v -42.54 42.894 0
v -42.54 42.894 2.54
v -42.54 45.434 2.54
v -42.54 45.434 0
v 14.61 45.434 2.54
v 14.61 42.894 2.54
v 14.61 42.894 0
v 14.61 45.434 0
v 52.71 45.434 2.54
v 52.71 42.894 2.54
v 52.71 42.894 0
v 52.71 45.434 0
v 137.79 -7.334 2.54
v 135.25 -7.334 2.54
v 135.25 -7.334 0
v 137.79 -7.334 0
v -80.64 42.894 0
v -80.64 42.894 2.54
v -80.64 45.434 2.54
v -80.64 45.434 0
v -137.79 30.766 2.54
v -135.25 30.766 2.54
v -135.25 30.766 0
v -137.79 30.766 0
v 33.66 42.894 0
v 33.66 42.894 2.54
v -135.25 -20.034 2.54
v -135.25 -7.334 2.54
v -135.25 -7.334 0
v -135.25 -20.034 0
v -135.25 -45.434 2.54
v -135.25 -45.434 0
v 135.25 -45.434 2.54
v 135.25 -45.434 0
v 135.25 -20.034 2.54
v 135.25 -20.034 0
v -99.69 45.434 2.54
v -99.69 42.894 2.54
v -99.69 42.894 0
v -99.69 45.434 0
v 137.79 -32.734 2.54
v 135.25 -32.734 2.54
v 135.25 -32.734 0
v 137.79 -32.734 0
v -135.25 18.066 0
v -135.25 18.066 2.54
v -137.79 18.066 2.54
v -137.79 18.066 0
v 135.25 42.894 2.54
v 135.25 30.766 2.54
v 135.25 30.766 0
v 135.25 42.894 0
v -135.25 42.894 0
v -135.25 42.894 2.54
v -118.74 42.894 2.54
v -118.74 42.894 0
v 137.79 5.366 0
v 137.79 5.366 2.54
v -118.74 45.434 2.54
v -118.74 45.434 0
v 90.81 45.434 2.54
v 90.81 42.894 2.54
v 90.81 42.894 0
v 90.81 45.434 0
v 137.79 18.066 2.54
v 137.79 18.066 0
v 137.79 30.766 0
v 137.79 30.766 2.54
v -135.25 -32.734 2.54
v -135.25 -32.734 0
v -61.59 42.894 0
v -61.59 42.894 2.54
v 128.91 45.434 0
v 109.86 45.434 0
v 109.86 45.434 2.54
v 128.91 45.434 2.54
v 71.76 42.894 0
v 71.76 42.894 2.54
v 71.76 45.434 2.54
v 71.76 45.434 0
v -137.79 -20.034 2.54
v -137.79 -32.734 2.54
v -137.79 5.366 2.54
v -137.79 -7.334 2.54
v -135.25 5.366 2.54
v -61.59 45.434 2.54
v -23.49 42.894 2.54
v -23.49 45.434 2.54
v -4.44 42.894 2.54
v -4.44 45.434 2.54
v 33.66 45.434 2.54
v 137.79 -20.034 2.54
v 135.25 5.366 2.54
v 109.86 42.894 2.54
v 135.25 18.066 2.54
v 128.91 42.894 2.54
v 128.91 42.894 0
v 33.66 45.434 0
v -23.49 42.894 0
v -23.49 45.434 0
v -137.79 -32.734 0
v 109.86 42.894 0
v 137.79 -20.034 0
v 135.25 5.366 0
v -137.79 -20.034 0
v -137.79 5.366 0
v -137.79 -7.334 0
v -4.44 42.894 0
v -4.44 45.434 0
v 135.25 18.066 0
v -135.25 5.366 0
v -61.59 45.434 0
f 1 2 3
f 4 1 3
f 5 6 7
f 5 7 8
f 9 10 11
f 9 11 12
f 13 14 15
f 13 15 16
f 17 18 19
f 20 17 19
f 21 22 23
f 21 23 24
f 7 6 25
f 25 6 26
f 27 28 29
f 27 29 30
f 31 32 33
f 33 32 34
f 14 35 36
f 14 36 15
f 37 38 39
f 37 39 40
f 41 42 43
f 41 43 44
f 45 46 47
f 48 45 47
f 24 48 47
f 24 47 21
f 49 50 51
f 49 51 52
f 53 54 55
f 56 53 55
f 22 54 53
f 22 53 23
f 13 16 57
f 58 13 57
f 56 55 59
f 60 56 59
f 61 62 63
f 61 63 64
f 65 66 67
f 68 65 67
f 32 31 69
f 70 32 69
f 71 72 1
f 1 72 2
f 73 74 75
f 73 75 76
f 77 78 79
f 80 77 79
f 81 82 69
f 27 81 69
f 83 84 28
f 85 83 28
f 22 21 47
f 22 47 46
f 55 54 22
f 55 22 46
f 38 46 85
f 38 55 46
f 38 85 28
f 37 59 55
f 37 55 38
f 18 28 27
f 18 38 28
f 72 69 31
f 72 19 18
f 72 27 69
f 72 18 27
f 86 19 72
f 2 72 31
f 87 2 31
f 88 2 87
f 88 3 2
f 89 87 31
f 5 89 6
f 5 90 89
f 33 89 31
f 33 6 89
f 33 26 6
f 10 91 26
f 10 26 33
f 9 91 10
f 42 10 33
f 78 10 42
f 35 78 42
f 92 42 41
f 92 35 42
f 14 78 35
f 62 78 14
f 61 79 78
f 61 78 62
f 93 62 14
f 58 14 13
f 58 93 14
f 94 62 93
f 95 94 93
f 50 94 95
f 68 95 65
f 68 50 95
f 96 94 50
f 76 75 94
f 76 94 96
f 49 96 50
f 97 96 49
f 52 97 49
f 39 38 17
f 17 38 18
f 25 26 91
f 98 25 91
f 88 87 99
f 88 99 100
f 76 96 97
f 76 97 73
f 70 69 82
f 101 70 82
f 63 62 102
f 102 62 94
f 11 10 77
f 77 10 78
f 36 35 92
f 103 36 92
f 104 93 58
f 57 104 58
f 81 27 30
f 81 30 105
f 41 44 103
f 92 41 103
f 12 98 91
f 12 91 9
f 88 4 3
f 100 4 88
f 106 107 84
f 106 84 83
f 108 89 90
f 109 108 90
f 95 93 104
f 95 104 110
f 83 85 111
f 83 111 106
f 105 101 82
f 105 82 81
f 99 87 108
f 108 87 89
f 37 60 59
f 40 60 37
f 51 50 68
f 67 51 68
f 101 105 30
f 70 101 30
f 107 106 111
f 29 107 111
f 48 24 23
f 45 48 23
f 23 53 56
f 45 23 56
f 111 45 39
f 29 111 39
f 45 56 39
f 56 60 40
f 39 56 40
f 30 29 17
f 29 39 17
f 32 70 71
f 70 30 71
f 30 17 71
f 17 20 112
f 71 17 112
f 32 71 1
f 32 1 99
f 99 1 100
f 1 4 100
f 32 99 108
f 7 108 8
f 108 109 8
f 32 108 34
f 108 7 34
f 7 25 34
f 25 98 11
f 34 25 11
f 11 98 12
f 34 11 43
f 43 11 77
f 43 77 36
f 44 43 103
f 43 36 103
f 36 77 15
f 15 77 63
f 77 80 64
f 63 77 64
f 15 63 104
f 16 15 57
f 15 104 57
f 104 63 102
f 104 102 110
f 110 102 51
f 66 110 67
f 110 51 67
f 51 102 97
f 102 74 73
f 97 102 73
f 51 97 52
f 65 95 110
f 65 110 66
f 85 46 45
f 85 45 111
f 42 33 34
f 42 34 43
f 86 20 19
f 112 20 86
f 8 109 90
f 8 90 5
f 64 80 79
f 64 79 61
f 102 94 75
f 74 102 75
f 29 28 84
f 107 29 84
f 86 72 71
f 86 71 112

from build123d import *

# Parameters (mm, degrees)
SKETCH1_W               = 275.57984
SKETCH1_H               = 90.8685
BOSS_EXTRUDE1_DEPTH     = 2.54
SKETCH2_W               = 2.54
SKETCH2_H               = 12.7
CUT_EXTRUDE1_DEPTH      = 146.109561114
LPATTERN1_COUNT         = 4
LPATTERN1_PITCH         = 25.4
MIRROR1_COPY_1_SKETCH_W = 2.54
MIRROR1_COPY_1_SKETCH_H = 12.7
MIRROR1_COPY_1_DEPTH    = 146.109561114
MIRROR1_COPY_2_SKETCH_W = 2.54
MIRROR1_COPY_2_SKETCH_H = 12.7
MIRROR1_COPY_2_DEPTH    = 146.109561114
MIRROR1_COPY_3_SKETCH_W = 2.54
MIRROR1_COPY_3_SKETCH_H = 12.7
MIRROR1_COPY_3_DEPTH    = 146.109561114
SKETCH3_W               = 19.05
SKETCH3_H               = 2.54
CUT_EXTRUDE2_DEPTH      = 146.109561114
LPATTERN2_COUNT         = 8
LPATTERN2_PITCH         = 38.1


with BuildPart() as part:
    # Sketch1 → Boss-Extrude1 (new body)
    with BuildSketch(Plane.XY):
        Rectangle(SKETCH1_W, SKETCH1_H)
    extrude(amount=BOSS_EXTRUDE1_DEPTH)

    # Sketch2 → Cut-Extrude1 (cut, through all)
    with BuildSketch(Plane.XY.offset(2.54)):
        with Locations((136.51992, -39.08425)):
            Rectangle(SKETCH2_W, SKETCH2_H)
    cut_extrude1 = extrude(amount=-CUT_EXTRUDE1_DEPTH, mode=Mode.SUBTRACT)

    # LPattern1: Cut-Extrude1 ×4
    with Locations(*[(0, i * LPATTERN1_PITCH, 0) for i in range(1, LPATTERN1_COUNT)]):
        add(cut_extrude1, mode=Mode.SUBTRACT)

    # Mirror1: Cut-Extrude1 across plane
    add(cut_extrude1.mirror(Plane(origin=(0, 0, 0), x_dir=(0, 0, 1), z_dir=(1, 0, 0))), mode=Mode.SUBTRACT)

    # Mirror1 copy 1 sketch → Mirror1 copy 1 (cut, through all)
    with BuildSketch(Plane(origin=(0, 25.4, 2.54), x_dir=(-1, 0, 0), z_dir=(0, 0, 1))):
        with Locations((136.51992, 39.08425)):
            Rectangle(MIRROR1_COPY_1_SKETCH_W, MIRROR1_COPY_1_SKETCH_H)
    extrude(amount=-MIRROR1_COPY_1_DEPTH, mode=Mode.SUBTRACT)

    # Mirror1 copy 2 sketch → Mirror1 copy 2 (cut, through all)
    with BuildSketch(Plane(origin=(0, 50.8, 2.54), x_dir=(-1, 0, 0), z_dir=(0, 0, 1))):
        with Locations((136.51992, 39.08425)):
            Rectangle(MIRROR1_COPY_2_SKETCH_W, MIRROR1_COPY_2_SKETCH_H)
    extrude(amount=-MIRROR1_COPY_2_DEPTH, mode=Mode.SUBTRACT)

    # Mirror1 copy 3 sketch → Mirror1 copy 3 (cut, through all)
    with BuildSketch(Plane(origin=(0, 76.2, 2.54), x_dir=(-1, 0, 0), z_dir=(0, 0, 1))):
        with Locations((136.51992, 39.08425)):
            Rectangle(MIRROR1_COPY_3_SKETCH_W, MIRROR1_COPY_3_SKETCH_H)
    extrude(amount=-MIRROR1_COPY_3_DEPTH, mode=Mode.SUBTRACT)

    # Sketch3 → Cut-Extrude2 (cut, through all)
    with BuildSketch(Plane.XY.offset(2.54)):
        with Locations((-128.26492, 44.16425)):
            Rectangle(SKETCH3_W, SKETCH3_H)
    cut_extrude2 = extrude(amount=-CUT_EXTRUDE2_DEPTH, mode=Mode.SUBTRACT)

    # LPattern2: Cut-Extrude2 ×8
    with Locations(*[(i * LPATTERN2_PITCH, 0, 0) for i in range(1, LPATTERN2_COUNT)]):
        add(cut_extrude2, mode=Mode.SUBTRACT)


solid = part.part
